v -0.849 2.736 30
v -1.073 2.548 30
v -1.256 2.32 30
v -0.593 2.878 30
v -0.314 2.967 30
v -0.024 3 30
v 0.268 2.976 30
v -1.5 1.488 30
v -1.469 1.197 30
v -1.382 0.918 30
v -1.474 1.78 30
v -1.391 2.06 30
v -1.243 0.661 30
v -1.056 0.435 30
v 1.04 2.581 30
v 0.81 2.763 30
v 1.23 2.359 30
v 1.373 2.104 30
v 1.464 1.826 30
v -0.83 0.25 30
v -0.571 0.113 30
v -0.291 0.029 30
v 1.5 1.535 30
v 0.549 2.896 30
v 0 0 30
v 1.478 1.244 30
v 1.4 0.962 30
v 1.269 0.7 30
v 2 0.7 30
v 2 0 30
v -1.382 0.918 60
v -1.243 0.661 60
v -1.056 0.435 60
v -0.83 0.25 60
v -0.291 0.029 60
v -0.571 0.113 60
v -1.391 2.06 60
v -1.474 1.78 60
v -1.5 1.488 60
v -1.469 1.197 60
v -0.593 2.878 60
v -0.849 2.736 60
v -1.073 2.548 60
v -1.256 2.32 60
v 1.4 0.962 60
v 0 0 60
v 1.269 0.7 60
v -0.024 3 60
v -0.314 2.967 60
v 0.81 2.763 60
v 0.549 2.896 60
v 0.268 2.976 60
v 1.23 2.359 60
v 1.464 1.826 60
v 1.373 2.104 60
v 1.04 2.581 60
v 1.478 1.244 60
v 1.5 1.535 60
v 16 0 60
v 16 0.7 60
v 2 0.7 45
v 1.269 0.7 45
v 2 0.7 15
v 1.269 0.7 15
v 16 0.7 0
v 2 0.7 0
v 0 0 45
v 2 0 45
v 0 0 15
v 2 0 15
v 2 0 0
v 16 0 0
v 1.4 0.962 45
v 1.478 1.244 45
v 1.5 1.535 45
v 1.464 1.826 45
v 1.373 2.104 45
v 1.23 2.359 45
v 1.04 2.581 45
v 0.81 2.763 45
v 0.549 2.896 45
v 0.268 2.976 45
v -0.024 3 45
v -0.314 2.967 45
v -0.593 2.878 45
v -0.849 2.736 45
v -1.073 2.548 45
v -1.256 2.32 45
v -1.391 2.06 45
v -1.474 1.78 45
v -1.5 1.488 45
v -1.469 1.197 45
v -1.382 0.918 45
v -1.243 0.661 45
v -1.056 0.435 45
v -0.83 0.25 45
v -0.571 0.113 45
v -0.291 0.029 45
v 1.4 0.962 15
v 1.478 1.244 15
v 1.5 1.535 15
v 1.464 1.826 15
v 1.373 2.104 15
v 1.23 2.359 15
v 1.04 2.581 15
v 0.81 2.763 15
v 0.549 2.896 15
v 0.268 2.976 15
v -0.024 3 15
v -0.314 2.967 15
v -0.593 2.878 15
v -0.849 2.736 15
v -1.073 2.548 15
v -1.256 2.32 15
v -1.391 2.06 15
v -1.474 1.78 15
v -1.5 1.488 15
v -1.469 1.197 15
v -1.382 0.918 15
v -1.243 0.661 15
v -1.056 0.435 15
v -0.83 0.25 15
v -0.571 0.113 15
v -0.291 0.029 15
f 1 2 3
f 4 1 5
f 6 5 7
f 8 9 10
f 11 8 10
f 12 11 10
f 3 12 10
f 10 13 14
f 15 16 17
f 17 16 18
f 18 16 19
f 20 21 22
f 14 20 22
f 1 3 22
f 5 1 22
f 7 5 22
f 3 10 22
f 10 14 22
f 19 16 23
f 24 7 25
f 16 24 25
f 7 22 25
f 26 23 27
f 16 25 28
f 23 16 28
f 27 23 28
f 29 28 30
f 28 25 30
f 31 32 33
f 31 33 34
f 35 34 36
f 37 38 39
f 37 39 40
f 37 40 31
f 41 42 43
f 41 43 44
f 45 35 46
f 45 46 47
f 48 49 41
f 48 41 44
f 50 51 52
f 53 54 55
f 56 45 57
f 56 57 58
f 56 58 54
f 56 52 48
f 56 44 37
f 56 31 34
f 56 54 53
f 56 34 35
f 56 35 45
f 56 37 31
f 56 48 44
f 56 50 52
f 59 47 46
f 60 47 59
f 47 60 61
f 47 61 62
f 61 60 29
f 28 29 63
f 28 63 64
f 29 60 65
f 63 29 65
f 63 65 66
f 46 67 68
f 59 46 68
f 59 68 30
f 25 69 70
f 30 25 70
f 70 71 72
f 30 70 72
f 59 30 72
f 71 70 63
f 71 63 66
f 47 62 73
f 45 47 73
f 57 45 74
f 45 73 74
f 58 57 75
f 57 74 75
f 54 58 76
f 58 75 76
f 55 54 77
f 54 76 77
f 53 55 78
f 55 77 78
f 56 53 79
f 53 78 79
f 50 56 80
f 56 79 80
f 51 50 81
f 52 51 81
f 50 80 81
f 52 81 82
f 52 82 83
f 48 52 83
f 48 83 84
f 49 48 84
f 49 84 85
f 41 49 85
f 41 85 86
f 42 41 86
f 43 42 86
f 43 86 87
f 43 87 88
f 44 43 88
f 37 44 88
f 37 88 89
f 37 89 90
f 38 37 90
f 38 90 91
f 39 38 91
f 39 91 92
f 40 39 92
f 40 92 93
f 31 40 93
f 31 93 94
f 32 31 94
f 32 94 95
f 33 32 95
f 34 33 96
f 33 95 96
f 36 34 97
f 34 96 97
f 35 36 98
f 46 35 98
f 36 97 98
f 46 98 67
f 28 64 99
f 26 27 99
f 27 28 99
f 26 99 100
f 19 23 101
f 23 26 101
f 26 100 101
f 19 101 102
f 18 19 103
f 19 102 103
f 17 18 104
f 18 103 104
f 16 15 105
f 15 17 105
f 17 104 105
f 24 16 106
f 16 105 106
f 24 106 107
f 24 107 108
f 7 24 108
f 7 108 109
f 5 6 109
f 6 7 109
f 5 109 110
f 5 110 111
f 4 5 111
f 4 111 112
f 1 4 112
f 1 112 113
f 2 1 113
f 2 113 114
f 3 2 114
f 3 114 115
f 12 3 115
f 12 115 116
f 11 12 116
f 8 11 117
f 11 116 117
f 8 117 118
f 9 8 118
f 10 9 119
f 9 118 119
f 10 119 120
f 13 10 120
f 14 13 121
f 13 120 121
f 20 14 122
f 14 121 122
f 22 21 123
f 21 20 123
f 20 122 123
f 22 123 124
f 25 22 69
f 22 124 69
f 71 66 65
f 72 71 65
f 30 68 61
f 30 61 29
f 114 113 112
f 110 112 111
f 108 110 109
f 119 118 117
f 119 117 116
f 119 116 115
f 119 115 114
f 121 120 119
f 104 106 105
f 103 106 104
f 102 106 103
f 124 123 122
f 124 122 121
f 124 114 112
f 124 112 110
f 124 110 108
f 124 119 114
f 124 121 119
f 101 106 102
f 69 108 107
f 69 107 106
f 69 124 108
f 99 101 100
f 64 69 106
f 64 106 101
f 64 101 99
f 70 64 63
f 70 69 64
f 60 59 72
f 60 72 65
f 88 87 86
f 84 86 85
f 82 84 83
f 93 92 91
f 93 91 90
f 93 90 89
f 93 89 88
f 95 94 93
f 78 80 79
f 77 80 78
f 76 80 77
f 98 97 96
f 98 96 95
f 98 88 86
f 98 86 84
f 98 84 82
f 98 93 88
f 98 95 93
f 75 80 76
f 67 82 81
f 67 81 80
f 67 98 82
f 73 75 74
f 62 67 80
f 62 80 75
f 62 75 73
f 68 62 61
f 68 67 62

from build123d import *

# Parameters (mm, degrees)
EXTRUSION1_DEPTH           = 60
EXTRUSION2_START           = -10
ESQUISSE2_W                = 7.046962448
ESQUISSE2_H                = 15
EXTRUSION2_DEPTH           = 73.139279043
R_P_TITION_LIN_AIRE1_COUNT = 2
R_P_TITION_LIN_AIRE1_PITCH = 30


with BuildPart() as part:
    # Esquisse1 → Extrusion1 (new body)
    with BuildSketch(Plane.XY):
        with BuildLine():
            Line((0, 0), (16, 0))
            Line((16, 0), (16, 0.7))
            Line((16, 0.7), (1.268857754, 0.7))
            ThreePointArc((1.268857754, 0.7), (-0.724568837, 2.813392554), (0, 0))
        make_face()
    extrude(amount=EXTRUSION1_DEPTH)

    # Esquisse2 → Extrusion2 (cut, through all)
    with BuildSketch(Plane(origin=(0, 0.7, 0), x_dir=(1, 0, 0), z_dir=(0, 1, 0)).offset(EXTRUSION2_START)):
        with Locations((-1.523481224, -37.5)):
            Rectangle(ESQUISSE2_W, ESQUISSE2_H)
    extrusion2 = extrude(amount=EXTRUSION2_DEPTH, mode=Mode.SUBTRACT)

    # Répétition linéaire1: Extrusion2 ×2
    with Locations(*[(0, 0, -i * R_P_TITION_LIN_AIRE1_PITCH) for i in range(1, R_P_TITION_LIN_AIRE1_COUNT)]):
        add(extrusion2, mode=Mode.SUBTRACT)


solid = part.part
